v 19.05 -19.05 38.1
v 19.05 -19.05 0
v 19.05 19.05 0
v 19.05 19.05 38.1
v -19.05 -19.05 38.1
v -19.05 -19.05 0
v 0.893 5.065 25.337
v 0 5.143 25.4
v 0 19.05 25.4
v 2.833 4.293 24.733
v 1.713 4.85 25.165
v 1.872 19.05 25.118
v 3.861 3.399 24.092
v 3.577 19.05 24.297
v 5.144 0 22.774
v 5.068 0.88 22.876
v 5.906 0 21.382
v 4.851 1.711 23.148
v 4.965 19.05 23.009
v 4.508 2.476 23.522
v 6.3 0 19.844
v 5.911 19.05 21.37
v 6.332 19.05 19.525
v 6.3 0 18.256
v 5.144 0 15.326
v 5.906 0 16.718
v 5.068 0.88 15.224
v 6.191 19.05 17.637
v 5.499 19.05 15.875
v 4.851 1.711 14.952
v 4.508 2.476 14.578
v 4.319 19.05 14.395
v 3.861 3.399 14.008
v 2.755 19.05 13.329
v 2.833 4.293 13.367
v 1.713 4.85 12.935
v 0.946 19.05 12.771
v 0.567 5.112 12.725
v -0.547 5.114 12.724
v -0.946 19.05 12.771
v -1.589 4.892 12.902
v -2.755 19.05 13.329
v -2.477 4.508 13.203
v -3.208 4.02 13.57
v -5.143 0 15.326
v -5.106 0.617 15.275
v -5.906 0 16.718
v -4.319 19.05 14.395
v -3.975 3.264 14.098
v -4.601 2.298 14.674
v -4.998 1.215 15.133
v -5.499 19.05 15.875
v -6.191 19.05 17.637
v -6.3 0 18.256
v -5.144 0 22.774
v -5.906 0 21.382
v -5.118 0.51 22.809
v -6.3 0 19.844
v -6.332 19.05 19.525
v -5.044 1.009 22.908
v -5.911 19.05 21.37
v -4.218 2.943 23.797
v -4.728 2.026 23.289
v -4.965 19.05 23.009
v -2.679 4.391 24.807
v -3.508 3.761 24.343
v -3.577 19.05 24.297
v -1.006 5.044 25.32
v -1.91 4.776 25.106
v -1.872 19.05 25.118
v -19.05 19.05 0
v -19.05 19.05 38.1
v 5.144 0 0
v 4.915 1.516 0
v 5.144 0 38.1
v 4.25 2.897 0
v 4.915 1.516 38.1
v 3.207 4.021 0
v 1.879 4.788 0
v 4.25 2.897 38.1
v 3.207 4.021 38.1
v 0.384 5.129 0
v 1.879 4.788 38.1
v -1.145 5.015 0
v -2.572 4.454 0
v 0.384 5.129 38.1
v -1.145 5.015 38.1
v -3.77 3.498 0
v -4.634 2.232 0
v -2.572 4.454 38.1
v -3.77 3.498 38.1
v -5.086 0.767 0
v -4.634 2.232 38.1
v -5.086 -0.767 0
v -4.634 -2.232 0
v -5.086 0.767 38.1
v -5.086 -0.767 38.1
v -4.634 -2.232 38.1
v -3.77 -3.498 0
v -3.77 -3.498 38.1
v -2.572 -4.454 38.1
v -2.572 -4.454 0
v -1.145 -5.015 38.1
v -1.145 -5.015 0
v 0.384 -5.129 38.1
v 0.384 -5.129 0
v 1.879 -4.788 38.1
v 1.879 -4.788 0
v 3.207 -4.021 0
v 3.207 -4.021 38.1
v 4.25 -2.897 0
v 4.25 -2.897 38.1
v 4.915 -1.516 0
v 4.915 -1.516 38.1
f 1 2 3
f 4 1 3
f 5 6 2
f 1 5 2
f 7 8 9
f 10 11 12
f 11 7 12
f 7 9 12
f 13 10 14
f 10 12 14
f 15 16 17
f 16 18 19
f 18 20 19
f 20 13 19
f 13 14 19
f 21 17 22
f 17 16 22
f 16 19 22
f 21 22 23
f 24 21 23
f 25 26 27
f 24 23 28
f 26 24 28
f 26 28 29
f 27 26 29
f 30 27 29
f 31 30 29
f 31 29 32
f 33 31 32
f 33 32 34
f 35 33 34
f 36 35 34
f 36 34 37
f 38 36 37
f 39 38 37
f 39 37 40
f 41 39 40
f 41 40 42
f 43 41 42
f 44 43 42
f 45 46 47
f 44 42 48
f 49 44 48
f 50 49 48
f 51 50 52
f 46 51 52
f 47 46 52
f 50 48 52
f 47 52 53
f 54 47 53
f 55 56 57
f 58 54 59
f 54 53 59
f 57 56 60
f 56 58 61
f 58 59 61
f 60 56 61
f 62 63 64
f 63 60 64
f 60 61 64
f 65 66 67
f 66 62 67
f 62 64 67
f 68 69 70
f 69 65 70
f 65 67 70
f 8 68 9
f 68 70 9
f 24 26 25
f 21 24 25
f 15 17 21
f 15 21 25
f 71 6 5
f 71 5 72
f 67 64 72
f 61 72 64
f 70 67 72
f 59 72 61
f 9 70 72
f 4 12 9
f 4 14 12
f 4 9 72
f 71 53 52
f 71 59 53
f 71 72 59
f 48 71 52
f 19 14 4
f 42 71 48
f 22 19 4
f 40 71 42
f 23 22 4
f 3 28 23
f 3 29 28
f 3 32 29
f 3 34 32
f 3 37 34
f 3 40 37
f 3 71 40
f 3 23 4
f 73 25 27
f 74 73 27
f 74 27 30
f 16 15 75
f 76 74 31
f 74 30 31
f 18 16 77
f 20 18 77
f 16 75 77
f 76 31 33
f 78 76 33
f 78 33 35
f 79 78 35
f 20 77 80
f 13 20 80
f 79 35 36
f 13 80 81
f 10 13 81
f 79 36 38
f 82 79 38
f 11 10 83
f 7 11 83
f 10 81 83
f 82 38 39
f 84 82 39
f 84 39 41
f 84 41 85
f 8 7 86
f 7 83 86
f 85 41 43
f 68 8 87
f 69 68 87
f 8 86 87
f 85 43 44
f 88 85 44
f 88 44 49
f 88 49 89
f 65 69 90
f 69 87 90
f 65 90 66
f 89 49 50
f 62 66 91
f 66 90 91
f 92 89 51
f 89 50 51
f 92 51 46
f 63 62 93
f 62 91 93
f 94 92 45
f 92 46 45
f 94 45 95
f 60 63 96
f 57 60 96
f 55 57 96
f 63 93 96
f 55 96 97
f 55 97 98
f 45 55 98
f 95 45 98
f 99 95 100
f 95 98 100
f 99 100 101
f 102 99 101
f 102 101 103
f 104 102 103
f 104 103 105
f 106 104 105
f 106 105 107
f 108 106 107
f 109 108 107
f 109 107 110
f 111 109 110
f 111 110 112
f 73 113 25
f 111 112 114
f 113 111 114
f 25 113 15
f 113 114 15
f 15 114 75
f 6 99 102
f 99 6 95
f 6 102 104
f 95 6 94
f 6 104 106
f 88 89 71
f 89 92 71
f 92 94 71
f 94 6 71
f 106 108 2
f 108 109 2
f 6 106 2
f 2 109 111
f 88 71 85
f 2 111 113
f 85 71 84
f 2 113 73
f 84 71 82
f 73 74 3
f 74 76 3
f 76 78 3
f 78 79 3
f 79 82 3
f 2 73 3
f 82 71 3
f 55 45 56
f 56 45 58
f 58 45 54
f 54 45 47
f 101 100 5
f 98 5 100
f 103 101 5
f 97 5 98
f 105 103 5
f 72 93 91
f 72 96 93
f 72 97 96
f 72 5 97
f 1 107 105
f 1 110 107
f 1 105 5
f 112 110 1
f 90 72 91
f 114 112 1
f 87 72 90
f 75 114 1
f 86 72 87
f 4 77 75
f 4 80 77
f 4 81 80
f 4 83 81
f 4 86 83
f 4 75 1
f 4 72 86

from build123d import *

# Parameters (mm, degrees)
SKETCH1_W           = 38.1
SKETCH1_H           = 38.1
BOSS_EXTRUDE1_DEPTH = 38.1
SKETCH2_R           = 5.1435
CUT_EXTRUDE1_DEPTH  = 38.1
SKETCH3_R           = 6.35
CUT_EXTRUDE2_DEPTH  = 19.05


with BuildPart() as part:
    # Sketch1 → Boss-Extrude1 (new body)
    with BuildSketch(Plane.XY):
        Rectangle(SKETCH1_W, SKETCH1_H)
    extrude(amount=BOSS_EXTRUDE1_DEPTH)

    # Sketch2 → Cut-Extrude1 (cut)
    with BuildSketch(Plane.XY.offset(38.1)):
        Circle(SKETCH2_R)
    extrude(amount=-CUT_EXTRUDE1_DEPTH, mode=Mode.SUBTRACT)

    # Sketch3 → Cut-Extrude2 (cut)
    with BuildSketch(Plane(origin=(0, 19.05, 0), x_dir=(1, 0, 0), z_dir=(0, 1, 0))):
        with Locations(Location((0, -19.05, 0), (0, 0, 270))):
            Circle(SKETCH3_R)
    extrude(amount=-CUT_EXTRUDE2_DEPTH, mode=Mode.SUBTRACT)


solid = part.part
